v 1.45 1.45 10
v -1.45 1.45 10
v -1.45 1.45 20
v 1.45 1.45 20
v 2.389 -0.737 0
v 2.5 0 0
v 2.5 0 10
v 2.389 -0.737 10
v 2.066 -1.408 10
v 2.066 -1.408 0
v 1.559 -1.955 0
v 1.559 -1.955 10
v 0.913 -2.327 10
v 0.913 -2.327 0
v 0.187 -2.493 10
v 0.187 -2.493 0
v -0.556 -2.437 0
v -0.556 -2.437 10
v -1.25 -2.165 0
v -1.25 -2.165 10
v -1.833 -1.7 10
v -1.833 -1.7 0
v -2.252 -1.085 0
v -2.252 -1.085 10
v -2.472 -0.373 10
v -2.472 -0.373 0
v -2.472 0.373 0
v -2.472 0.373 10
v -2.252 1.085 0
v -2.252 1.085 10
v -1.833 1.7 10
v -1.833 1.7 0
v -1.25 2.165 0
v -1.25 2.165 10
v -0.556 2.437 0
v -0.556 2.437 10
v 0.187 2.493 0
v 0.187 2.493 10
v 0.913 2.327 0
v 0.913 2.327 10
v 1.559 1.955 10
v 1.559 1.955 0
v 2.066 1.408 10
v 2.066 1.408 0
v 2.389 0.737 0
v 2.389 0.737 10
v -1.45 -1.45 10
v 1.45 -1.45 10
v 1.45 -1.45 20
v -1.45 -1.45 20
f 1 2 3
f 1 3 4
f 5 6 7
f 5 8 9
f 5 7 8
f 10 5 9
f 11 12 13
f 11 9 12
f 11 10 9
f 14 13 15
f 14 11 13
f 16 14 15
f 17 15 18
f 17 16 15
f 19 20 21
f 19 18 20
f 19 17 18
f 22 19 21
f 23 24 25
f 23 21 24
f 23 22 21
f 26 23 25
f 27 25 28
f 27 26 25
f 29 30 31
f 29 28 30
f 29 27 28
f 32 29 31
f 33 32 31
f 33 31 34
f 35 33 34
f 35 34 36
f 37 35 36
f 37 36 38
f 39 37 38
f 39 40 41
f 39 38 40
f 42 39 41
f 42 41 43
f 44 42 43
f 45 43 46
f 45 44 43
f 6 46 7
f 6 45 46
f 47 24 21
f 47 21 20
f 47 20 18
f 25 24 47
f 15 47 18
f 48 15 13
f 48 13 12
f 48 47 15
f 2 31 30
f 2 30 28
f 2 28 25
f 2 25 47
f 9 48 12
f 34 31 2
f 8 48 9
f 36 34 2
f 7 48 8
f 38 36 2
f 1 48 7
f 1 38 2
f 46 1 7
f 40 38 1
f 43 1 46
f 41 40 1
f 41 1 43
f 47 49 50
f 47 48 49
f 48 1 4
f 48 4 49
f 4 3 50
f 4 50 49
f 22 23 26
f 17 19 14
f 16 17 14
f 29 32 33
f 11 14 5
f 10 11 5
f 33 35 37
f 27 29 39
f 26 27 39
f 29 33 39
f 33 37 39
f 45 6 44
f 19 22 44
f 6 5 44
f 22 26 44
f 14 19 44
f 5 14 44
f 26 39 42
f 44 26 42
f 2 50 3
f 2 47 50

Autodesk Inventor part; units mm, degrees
ref_plane "YZ Plane" through (0, 0, 0) normal (1, 0, 0) x (0, 1, 0)
ref_plane "XZ Plane" through (0, 0, 0) normal (0, 1, 0) x (-1, 0, 0)
ref_plane "XY Plane" through (0, 0, 0) normal (0, 0, 1) x (1, 0, 0)
sketch "Sketch1" plane through (0, 0, 0) normal (0, 0, 1) x (1, 0, 0)
  circle A0 centre (0, 0) radius 2.5
  dimension "d0" = 5
extrude "Extrusion1" add sketch "Sketch1" along normal blind 10
sketch "Sketch2" plane through (0, 0, 10) normal (0, 0, 1) x (1, 0, 0)
  line L0 (-1.45, 1.45) -> (1.45, 1.45)
  line L1 (1.45, 1.45) -> (1.45, -1.45)
  line L2 (1.45, -1.45) -> (-1.45, -1.45)
  line L3 (-1.45, -1.45) -> (-1.45, 1.45)
  line L4 (-1.45, 1.45) -> (1.45, -1.45) construction
  line L5 (1.45, 1.45) -> (-1.45, -1.45) construction
  point P0 (0, 0)
  dimension "d3" = 2.9
extrude "Extrusion2" add sketch "Sketch2" along normal blind 10
properties part number "MINI Stepper Shaft ( Pinion )"
